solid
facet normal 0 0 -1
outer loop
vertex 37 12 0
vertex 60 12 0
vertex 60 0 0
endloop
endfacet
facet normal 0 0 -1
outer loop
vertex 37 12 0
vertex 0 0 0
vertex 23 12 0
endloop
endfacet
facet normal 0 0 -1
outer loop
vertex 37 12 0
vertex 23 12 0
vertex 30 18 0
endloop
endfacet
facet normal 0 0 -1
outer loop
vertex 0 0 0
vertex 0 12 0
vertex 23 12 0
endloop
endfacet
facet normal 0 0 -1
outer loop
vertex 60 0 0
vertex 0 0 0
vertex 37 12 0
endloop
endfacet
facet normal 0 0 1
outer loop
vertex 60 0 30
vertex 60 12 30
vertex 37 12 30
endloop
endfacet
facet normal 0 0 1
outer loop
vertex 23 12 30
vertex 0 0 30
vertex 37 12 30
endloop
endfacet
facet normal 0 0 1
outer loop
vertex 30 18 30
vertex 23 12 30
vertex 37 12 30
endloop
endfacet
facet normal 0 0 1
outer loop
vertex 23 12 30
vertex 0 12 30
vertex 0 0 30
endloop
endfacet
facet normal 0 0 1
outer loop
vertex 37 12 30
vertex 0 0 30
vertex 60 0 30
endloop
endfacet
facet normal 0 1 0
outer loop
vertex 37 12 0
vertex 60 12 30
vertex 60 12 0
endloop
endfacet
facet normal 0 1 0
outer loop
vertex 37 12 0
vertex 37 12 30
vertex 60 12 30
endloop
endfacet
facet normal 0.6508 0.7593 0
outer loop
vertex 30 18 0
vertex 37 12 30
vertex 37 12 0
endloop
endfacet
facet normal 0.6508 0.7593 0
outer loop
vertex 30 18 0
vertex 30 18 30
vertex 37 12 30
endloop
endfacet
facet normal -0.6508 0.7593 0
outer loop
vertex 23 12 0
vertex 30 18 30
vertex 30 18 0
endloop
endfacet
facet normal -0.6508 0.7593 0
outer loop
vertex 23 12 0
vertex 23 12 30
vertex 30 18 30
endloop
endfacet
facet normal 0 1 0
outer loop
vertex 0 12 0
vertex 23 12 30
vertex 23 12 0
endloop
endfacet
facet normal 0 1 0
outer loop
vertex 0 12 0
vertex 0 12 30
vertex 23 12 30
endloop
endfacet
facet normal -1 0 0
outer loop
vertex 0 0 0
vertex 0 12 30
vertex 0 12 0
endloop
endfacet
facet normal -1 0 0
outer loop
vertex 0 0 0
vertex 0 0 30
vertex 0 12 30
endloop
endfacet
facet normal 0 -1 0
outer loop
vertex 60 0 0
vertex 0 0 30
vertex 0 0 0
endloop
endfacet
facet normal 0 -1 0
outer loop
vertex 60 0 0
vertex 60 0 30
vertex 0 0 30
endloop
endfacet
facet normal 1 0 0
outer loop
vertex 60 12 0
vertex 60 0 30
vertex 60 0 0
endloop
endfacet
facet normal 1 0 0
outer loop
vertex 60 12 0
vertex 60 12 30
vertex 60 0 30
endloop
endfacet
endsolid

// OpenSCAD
$fn = 32;

// ----------------------------------------------------------------------
// V guide rail: vrib, 60 mm wide
// ----------------------------------------------------------------------

// --- parameters (mm) ---
rail_w = 60;              // rail width, X
base_t = 12;              // base plate thickness
v_depth = 6;              // V feature depth / height
v_half_w = 7;             // half width of the V at the base face
plate_t = 30;             // rail length, Z (the extrusion height)
fit_tol = 0.05;           // declared fit tolerance (prompt contract)
free_tol = 0.2;           // declared free tolerance (prompt contract)

profile = [[0, 0], [60, 0], [60, 12], [37, 12], [30, 18], [23, 12], [0, 12]];  // primary outline, 7 points, counter clockwise

// --- the one profile operation ---
linear_extrude(height = plate_t) polygon(points = profile);
